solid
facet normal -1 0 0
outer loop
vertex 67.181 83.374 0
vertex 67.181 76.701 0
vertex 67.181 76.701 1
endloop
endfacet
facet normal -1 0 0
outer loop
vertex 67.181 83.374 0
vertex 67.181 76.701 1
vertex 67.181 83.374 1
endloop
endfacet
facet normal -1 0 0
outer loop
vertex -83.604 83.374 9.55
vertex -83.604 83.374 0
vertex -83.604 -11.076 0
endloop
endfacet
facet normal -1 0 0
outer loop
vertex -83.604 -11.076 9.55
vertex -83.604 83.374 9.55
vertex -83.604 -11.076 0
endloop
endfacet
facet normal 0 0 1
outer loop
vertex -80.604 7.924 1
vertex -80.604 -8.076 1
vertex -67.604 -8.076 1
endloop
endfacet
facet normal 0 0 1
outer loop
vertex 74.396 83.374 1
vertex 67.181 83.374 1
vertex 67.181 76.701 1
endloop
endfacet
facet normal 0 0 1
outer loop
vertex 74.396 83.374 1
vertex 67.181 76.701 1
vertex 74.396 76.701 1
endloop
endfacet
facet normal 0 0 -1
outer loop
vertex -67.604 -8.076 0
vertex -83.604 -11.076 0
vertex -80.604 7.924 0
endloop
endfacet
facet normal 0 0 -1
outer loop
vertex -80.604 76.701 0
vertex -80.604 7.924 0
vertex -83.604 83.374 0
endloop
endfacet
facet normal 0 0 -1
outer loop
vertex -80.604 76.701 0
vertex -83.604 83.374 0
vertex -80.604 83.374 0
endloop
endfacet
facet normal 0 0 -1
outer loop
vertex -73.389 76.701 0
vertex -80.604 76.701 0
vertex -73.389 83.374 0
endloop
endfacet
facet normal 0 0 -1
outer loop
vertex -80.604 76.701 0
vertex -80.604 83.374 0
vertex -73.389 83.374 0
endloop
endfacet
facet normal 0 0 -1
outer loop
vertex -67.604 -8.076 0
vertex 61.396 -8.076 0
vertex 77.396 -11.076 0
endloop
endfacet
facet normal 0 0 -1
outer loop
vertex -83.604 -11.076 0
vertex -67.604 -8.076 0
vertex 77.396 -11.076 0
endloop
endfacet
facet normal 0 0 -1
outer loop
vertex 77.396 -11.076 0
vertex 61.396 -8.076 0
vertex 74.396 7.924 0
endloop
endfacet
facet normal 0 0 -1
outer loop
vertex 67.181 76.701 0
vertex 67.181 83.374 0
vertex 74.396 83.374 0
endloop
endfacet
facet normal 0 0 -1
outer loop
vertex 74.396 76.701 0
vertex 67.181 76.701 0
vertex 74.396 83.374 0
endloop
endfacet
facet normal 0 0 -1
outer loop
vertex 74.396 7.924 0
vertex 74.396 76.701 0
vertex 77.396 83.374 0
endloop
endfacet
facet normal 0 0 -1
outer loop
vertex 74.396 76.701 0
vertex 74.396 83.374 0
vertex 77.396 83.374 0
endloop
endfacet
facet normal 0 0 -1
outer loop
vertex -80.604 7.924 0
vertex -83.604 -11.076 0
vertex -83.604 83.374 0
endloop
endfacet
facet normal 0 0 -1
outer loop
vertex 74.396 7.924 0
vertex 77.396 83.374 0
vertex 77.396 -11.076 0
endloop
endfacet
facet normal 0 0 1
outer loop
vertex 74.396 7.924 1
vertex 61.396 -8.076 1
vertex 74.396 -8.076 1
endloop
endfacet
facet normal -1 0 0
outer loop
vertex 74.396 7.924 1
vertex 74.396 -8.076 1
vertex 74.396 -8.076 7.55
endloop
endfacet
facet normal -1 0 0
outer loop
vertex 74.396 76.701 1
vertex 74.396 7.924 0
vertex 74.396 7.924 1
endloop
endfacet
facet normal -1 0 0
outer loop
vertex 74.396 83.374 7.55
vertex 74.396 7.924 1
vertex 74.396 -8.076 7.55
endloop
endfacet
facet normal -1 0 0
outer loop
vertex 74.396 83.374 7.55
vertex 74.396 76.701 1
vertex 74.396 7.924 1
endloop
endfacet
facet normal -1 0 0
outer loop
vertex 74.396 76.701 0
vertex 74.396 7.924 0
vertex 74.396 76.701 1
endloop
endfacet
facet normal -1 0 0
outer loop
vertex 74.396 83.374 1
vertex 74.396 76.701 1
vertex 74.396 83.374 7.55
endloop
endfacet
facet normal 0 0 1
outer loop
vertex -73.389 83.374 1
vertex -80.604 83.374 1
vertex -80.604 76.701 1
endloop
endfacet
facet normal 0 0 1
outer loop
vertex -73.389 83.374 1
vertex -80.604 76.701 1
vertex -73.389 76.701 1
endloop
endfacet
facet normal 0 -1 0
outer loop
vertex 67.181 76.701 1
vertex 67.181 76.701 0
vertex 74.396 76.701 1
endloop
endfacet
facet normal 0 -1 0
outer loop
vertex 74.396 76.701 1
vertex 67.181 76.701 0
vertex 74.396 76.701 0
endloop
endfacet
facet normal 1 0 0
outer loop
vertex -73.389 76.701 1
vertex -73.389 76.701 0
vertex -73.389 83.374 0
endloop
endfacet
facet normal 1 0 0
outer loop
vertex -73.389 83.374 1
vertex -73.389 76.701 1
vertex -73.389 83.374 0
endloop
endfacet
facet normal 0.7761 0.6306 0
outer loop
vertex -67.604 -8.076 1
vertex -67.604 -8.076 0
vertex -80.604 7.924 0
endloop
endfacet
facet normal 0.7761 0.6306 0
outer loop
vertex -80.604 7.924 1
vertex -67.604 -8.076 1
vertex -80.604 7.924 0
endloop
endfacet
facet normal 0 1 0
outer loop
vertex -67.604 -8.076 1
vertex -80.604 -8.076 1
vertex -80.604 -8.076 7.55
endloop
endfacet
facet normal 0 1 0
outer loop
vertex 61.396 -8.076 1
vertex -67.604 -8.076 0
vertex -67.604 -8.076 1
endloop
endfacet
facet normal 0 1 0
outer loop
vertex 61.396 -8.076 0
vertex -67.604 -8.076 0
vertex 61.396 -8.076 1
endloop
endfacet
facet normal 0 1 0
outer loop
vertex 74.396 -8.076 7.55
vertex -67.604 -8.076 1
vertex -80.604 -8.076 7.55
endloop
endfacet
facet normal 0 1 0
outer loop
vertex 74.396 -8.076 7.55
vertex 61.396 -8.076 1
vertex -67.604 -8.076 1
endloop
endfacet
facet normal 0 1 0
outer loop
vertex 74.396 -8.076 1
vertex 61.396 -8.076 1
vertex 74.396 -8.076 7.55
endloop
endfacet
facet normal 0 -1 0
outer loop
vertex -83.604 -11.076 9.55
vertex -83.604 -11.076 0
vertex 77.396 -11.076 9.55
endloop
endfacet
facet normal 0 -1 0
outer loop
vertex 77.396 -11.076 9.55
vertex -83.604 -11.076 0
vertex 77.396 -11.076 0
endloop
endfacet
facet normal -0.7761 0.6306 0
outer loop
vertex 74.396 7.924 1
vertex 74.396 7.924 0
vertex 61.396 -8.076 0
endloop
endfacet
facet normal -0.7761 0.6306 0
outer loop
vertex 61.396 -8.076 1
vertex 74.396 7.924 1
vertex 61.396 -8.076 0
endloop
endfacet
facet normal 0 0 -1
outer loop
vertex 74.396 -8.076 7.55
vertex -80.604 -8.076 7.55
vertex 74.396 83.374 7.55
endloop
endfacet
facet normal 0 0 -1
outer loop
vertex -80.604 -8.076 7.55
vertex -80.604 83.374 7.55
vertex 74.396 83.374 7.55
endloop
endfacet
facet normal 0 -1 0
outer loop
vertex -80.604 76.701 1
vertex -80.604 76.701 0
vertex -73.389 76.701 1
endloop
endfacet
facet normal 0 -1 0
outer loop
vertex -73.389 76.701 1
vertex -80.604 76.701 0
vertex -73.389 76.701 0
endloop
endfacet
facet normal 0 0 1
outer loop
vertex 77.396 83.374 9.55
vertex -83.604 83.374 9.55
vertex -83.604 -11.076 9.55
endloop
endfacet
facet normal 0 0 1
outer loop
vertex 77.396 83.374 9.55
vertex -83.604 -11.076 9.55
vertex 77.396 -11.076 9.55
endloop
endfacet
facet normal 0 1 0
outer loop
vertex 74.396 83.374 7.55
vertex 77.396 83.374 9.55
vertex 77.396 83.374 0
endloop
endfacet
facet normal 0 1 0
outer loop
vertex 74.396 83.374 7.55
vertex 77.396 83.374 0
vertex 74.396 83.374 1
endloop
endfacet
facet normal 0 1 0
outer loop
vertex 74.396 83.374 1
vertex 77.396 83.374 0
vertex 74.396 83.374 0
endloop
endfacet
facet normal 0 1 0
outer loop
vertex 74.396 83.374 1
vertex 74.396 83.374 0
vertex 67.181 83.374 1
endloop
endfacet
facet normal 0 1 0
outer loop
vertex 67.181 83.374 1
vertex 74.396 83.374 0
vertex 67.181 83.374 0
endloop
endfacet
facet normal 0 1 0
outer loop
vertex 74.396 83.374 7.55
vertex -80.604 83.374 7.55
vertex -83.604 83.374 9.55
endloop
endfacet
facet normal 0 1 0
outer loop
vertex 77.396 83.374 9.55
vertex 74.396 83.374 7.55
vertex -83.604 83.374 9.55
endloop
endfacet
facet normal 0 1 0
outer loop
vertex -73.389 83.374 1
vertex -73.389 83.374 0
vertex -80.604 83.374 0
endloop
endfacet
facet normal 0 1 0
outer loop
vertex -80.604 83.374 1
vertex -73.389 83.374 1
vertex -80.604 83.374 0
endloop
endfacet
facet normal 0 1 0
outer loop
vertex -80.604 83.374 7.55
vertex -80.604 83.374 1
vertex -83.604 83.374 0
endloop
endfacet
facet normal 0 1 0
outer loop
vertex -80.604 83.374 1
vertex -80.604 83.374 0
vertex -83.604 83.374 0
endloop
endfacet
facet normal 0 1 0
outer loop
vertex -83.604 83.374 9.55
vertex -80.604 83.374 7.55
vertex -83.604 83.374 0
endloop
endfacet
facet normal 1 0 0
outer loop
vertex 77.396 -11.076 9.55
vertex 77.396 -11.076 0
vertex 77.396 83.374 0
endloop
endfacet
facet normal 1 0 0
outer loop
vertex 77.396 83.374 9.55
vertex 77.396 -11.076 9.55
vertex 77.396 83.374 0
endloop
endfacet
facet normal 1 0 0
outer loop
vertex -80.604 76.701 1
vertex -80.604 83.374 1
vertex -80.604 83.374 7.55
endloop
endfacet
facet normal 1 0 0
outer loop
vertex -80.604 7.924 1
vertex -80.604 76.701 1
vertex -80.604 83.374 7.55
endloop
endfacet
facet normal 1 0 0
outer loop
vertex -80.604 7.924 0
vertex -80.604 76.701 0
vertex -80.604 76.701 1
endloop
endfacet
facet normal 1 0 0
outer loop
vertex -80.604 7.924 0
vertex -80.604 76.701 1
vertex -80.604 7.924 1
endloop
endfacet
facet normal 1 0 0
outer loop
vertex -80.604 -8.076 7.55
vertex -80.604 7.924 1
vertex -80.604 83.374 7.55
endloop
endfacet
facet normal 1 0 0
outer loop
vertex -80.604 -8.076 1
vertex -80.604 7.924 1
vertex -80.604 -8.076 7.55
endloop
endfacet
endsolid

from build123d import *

# Parameters (mm, degrees)
F0_W     = 7.2151930332
F0_H     = 6.6723177403
F1_DEPTH = 9.55
F2_DEPTH = 7.55
F3_DEPTH = 1


with BuildPart() as f1:
    # F0 (on Top) → F1 (new body)
    with BuildSketch(Plane.XY):
        Polygon((-80.6037993431, 76.7011865973), (-80.6037993431, 83.3735043377), (-83.6037993431, 83.3735043377), (-83.6037993431, -11.0764956623), (77.3962006569, -11.0764956623), (77.3962006569, 83.3735043377), (74.3962006569, 83.3735043377), (74.3962006569, 76.7011865973), (74.3962006569, 7.9235043377), (74.3962006569, -8.0764956623), (61.3962006569, -8.0764956623), (-67.6037993431, -8.0764956623), (-80.6037993431, -8.0764956623), (-80.6037993431, 7.9235043377), align=None)
        Polygon((-67.6037993431, -8.0764956623), (-80.6037993431, 7.9235043377), (-80.6037993431, -8.0764956623), align=None)
        Polygon((74.3962006569, 7.9235043377), (61.3962006569, -8.0764956623), (74.3962006569, -8.0764956623), align=None)
        Polygon((67.1810076237, 83.3735043377), (-73.3886063099, 83.3735043377), (-73.3886063099, 76.7011865973), (-80.6037993431, 76.7011865973), (-80.6037993431, 7.9235043377), (-67.6037993431, -8.0764956623), (61.3962006569, -8.0764956623), (74.3962006569, 7.9235043377), (74.3962006569, 76.7011865973), (67.1810076237, 76.7011865973), align=None)
        with Locations((70.7886041403, 80.0373454675)):
            Rectangle(F0_W, F0_H)
        with Locations((-76.9962028265, 80.0373454675)):
            Rectangle(F0_W, F0_H)
    extrude(amount=F1_DEPTH)

    # F0 (on Top) → F2 (cut)
    with BuildSketch(Plane.XY):
        Polygon((67.1810076237, 83.3735043377), (-73.3886063099, 83.3735043377), (-73.3886063099, 76.7011865973), (-80.6037993431, 76.7011865973), (-80.6037993431, 7.9235043377), (-67.6037993431, -8.0764956623), (61.3962006569, -8.0764956623), (74.3962006569, 7.9235043377), (74.3962006569, 76.7011865973), (67.1810076237, 76.7011865973), align=None)
        Polygon((-67.6037993431, -8.0764956623), (-80.6037993431, 7.9235043377), (-80.6037993431, -8.0764956623), align=None)
        Polygon((74.3962006569, 7.9235043377), (61.3962006569, -8.0764956623), (74.3962006569, -8.0764956623), align=None)
        with Locations((70.7886041403, 80.0373454675)):
            Rectangle(F0_W, F0_H)
        with Locations((-76.9962028265, 80.0373454675)):
            Rectangle(F0_W, F0_H)
    extrude(amount=F2_DEPTH, mode=Mode.SUBTRACT)

    # F0 (on Top) → F3 (join)
    with BuildSketch(Plane.XY):
        Polygon((-67.6037993431, -8.0764956623), (-80.6037993431, 7.9235043377), (-80.6037993431, -8.0764956623), align=None)
        Polygon((74.3962006569, 7.9235043377), (61.3962006569, -8.0764956623), (74.3962006569, -8.0764956623), align=None)
        with Locations((70.7886041403, 80.0373454675)):
            Rectangle(F0_W, F0_H)
        with Locations((-76.9962028265, 80.0373454675)):
            Rectangle(F0_W, F0_H)
    extrude(amount=F3_DEPTH)


solid = f1.part
